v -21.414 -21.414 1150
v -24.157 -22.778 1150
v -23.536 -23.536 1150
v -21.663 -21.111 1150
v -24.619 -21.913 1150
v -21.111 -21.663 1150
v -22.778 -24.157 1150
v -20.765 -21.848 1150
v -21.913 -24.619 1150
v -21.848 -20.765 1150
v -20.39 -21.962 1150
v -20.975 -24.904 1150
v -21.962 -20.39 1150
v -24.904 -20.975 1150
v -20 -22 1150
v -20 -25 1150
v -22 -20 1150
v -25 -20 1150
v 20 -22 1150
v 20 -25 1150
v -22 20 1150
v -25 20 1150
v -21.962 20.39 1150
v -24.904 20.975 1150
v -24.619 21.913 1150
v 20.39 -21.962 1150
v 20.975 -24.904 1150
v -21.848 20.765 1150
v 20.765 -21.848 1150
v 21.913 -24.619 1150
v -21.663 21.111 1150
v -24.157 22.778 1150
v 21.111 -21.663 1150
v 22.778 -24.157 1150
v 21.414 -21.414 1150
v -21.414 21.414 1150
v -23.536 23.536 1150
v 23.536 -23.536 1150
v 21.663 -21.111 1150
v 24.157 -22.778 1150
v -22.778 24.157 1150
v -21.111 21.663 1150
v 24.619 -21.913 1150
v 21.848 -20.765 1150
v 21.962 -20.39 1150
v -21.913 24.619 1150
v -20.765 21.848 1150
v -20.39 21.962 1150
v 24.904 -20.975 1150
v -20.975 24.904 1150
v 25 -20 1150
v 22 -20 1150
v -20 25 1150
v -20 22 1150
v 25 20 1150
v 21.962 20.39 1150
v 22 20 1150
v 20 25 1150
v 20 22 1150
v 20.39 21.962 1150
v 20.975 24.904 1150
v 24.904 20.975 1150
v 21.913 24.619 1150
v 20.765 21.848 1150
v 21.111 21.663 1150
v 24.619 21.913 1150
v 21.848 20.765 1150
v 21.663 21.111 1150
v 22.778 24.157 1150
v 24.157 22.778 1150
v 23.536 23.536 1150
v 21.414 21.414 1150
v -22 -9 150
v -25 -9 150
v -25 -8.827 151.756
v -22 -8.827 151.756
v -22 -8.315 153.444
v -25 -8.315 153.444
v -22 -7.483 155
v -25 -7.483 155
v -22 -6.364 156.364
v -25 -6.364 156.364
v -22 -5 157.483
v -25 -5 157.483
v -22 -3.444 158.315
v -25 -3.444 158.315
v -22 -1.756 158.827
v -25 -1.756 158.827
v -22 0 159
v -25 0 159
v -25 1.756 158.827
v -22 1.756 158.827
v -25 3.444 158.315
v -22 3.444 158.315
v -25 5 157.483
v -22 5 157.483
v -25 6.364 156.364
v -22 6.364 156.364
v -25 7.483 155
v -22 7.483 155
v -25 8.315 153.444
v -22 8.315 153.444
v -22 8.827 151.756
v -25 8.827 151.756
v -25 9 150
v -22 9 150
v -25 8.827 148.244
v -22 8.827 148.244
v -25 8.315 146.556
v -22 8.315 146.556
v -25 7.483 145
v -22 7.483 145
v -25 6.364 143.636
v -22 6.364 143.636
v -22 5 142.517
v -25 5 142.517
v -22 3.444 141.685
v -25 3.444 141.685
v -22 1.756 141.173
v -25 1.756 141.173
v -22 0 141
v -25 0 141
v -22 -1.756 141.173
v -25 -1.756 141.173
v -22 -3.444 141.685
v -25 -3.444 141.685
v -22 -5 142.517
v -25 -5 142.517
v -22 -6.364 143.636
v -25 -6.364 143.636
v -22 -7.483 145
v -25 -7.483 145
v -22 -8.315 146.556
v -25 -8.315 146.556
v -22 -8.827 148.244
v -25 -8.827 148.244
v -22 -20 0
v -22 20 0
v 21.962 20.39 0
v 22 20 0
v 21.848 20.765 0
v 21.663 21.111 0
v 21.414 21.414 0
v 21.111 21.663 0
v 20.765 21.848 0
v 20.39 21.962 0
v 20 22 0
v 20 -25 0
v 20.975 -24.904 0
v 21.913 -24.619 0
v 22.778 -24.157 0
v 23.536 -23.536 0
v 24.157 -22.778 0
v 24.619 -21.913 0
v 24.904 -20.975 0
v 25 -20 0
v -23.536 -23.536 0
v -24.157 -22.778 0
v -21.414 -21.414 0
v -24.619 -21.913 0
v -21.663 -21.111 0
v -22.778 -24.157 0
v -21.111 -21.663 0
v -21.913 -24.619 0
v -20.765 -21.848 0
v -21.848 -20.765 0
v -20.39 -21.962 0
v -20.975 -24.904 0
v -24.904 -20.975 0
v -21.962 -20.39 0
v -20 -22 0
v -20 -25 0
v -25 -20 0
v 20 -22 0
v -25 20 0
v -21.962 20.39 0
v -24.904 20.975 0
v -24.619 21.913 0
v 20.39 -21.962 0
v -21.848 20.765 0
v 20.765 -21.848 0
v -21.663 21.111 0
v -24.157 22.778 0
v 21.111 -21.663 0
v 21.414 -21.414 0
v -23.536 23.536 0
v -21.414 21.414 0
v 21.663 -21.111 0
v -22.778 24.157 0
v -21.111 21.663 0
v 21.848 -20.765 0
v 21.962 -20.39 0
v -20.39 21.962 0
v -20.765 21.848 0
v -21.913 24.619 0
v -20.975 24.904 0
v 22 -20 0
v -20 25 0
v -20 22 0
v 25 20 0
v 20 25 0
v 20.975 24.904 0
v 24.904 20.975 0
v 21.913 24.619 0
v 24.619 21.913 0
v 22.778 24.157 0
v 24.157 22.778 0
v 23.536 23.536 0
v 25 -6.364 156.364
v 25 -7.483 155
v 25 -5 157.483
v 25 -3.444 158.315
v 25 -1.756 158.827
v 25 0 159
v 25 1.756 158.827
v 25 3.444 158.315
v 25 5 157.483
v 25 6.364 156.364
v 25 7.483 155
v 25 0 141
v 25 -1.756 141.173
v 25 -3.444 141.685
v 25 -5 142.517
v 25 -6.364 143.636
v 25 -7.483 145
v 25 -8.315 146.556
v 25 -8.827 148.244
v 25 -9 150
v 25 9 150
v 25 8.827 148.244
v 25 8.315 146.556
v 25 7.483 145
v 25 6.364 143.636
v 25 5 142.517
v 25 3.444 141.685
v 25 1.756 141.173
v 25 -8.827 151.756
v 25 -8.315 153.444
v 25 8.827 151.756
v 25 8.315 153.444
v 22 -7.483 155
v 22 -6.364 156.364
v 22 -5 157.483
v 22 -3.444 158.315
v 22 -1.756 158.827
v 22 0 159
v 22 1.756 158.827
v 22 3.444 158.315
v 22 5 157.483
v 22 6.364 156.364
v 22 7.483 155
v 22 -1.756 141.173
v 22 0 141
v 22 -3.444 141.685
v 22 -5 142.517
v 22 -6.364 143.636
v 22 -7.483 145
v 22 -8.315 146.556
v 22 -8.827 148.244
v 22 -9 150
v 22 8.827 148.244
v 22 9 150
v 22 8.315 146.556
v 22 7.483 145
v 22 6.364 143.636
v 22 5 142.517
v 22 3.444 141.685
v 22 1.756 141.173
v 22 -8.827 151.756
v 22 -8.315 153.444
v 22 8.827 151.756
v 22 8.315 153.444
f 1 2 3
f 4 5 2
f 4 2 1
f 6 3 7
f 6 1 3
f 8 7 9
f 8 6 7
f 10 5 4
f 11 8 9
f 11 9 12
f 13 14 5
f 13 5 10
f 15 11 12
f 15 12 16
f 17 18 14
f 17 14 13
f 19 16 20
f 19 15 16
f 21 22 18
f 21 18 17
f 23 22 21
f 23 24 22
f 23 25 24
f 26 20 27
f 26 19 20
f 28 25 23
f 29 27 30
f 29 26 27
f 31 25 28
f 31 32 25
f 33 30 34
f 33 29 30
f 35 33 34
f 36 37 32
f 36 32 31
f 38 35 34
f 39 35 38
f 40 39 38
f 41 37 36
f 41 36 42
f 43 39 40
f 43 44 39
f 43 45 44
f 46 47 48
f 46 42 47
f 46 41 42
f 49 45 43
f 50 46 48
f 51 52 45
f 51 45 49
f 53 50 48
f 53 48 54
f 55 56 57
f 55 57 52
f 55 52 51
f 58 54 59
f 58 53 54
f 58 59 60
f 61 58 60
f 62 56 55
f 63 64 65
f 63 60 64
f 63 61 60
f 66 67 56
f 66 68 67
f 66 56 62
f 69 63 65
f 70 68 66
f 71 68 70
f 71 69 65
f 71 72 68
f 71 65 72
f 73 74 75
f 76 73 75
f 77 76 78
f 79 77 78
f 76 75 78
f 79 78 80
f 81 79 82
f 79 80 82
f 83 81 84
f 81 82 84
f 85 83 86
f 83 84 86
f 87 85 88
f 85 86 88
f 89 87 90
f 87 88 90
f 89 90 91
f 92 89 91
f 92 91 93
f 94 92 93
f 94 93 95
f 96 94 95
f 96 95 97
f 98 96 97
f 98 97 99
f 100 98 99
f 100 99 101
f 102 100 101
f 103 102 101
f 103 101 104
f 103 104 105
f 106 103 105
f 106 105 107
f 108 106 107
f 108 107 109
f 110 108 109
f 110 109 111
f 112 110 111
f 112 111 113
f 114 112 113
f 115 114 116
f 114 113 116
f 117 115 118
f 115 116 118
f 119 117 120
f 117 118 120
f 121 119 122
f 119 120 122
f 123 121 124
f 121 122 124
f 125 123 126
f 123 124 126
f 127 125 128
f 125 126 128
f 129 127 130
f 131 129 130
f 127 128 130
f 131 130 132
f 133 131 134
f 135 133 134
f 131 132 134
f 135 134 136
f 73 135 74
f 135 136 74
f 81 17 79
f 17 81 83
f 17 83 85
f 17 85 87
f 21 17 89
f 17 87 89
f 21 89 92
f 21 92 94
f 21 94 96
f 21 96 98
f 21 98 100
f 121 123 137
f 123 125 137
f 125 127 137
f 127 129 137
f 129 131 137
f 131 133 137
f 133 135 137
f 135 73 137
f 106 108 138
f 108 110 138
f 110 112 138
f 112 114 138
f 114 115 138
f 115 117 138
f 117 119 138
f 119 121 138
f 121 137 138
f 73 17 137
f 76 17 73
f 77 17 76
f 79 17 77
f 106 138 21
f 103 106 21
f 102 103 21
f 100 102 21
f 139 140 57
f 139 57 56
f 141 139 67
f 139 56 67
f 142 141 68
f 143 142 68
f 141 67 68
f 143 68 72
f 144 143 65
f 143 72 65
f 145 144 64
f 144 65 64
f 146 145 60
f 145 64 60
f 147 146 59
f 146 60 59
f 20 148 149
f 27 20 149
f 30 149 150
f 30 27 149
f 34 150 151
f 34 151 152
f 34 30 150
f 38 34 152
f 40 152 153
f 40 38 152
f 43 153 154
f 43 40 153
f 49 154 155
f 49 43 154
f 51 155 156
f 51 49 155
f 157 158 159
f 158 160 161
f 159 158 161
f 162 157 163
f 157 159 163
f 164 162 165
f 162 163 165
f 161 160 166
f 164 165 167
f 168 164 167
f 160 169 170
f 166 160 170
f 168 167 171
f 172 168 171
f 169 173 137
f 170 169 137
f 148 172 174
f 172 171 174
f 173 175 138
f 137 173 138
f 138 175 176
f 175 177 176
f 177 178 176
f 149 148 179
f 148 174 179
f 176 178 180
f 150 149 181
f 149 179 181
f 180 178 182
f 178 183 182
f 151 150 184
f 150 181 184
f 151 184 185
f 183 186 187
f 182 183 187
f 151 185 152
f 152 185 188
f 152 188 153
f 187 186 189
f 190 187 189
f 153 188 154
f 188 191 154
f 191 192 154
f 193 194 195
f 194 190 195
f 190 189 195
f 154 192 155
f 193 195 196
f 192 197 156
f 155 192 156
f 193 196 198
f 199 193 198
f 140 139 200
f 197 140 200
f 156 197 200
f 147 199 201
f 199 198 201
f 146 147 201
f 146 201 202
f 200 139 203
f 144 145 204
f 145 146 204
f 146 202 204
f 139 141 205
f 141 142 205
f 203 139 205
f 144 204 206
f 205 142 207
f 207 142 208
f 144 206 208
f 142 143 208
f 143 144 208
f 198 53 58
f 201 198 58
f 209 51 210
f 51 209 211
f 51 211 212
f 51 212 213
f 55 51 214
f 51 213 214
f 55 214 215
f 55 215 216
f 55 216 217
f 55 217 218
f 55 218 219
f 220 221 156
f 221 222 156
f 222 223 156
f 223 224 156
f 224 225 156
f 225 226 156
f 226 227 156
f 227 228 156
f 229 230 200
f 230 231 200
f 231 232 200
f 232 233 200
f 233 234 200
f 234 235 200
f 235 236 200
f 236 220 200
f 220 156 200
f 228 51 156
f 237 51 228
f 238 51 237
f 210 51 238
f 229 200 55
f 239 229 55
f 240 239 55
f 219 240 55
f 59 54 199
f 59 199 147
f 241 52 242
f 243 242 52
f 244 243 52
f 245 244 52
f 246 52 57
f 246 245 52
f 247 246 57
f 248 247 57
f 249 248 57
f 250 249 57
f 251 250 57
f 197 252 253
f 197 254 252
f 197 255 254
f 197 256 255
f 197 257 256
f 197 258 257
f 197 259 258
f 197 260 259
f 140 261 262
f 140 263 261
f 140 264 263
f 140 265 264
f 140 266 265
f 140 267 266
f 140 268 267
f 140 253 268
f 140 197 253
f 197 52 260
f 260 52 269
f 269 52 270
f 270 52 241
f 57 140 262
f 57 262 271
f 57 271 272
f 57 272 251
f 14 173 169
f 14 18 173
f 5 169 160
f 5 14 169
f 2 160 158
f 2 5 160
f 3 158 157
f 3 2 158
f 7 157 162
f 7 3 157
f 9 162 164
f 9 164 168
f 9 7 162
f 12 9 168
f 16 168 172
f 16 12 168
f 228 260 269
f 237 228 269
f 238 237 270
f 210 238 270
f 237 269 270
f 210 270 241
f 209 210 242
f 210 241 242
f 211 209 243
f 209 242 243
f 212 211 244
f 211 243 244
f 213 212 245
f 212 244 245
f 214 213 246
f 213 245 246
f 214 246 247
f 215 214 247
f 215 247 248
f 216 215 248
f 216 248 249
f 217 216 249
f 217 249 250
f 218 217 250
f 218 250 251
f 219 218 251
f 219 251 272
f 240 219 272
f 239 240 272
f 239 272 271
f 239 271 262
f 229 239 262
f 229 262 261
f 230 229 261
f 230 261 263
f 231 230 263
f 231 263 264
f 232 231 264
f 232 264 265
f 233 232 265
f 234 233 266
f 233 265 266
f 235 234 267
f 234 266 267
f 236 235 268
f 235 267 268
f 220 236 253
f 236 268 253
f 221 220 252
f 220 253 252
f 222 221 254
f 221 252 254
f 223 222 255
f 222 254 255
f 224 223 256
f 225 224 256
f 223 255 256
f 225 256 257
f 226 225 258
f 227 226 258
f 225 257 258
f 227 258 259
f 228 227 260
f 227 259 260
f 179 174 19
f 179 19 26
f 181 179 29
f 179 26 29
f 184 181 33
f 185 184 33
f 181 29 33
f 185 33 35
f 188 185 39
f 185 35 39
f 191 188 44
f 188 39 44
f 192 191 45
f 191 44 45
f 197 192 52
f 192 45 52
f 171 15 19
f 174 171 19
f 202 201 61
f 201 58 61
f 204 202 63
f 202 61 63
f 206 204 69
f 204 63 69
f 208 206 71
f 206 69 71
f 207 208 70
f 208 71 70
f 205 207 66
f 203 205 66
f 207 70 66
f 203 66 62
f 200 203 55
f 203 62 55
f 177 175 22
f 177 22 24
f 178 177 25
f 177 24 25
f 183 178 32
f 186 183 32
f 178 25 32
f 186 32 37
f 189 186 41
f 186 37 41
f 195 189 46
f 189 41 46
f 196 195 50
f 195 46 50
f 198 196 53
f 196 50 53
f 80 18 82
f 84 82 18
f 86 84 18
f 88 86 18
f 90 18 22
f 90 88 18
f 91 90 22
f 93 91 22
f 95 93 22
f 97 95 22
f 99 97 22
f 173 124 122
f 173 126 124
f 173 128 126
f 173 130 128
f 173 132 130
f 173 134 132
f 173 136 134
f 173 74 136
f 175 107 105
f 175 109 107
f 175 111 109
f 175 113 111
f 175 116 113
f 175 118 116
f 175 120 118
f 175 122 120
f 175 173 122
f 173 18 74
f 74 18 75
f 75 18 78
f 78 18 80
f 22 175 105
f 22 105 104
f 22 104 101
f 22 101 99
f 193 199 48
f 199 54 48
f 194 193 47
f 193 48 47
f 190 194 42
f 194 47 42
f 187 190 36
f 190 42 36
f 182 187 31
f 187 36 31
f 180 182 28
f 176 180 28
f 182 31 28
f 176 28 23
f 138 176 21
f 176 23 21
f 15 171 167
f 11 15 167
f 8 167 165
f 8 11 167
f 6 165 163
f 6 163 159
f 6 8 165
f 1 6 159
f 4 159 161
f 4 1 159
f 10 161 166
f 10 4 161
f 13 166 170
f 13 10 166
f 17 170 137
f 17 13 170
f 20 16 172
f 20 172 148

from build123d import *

# Parameters (mm, degrees)
F0_W     = 50
F0_H     = 50
F0_W_2   = 44
F0_H_2   = 44
F1_DEPTH = 1150
F2_R     = 2
F3_R     = 5
F5_D     = 18


with BuildPart() as f1:
    # F0 (on Top) → F1 (new body)
    with BuildSketch(Plane.XY):
        Rectangle(F0_W, F0_H)
        Rectangle(F0_W_2, F0_H_2, mode=Mode.SUBTRACT)
    extrude(amount=F1_DEPTH)

    # F2
    f2_edges = [f1.edges().sort_by_distance(p)[0] for p in [
        (22, 22, 575),
        (-22, -22, 575),
        (-22, 22, 575),
        (22, -22, 575),
    ]]
    fillet(f2_edges, radius=F2_R)

    # F3
    f3_edges = [f1.edges().sort_by_distance(p)[0] for p in [
        (-25, 25, 575),
        (25, 25, 575),
        (-25, -25, 575),
        (25, -25, 575),
    ]]
    fillet(f3_edges, radius=F3_R)

    # F5 (through all)
    with Locations(Plane.YZ.offset(25)):
        with Locations((0, 150)):
            Hole(F5_D / 2)


solid = f1.part
